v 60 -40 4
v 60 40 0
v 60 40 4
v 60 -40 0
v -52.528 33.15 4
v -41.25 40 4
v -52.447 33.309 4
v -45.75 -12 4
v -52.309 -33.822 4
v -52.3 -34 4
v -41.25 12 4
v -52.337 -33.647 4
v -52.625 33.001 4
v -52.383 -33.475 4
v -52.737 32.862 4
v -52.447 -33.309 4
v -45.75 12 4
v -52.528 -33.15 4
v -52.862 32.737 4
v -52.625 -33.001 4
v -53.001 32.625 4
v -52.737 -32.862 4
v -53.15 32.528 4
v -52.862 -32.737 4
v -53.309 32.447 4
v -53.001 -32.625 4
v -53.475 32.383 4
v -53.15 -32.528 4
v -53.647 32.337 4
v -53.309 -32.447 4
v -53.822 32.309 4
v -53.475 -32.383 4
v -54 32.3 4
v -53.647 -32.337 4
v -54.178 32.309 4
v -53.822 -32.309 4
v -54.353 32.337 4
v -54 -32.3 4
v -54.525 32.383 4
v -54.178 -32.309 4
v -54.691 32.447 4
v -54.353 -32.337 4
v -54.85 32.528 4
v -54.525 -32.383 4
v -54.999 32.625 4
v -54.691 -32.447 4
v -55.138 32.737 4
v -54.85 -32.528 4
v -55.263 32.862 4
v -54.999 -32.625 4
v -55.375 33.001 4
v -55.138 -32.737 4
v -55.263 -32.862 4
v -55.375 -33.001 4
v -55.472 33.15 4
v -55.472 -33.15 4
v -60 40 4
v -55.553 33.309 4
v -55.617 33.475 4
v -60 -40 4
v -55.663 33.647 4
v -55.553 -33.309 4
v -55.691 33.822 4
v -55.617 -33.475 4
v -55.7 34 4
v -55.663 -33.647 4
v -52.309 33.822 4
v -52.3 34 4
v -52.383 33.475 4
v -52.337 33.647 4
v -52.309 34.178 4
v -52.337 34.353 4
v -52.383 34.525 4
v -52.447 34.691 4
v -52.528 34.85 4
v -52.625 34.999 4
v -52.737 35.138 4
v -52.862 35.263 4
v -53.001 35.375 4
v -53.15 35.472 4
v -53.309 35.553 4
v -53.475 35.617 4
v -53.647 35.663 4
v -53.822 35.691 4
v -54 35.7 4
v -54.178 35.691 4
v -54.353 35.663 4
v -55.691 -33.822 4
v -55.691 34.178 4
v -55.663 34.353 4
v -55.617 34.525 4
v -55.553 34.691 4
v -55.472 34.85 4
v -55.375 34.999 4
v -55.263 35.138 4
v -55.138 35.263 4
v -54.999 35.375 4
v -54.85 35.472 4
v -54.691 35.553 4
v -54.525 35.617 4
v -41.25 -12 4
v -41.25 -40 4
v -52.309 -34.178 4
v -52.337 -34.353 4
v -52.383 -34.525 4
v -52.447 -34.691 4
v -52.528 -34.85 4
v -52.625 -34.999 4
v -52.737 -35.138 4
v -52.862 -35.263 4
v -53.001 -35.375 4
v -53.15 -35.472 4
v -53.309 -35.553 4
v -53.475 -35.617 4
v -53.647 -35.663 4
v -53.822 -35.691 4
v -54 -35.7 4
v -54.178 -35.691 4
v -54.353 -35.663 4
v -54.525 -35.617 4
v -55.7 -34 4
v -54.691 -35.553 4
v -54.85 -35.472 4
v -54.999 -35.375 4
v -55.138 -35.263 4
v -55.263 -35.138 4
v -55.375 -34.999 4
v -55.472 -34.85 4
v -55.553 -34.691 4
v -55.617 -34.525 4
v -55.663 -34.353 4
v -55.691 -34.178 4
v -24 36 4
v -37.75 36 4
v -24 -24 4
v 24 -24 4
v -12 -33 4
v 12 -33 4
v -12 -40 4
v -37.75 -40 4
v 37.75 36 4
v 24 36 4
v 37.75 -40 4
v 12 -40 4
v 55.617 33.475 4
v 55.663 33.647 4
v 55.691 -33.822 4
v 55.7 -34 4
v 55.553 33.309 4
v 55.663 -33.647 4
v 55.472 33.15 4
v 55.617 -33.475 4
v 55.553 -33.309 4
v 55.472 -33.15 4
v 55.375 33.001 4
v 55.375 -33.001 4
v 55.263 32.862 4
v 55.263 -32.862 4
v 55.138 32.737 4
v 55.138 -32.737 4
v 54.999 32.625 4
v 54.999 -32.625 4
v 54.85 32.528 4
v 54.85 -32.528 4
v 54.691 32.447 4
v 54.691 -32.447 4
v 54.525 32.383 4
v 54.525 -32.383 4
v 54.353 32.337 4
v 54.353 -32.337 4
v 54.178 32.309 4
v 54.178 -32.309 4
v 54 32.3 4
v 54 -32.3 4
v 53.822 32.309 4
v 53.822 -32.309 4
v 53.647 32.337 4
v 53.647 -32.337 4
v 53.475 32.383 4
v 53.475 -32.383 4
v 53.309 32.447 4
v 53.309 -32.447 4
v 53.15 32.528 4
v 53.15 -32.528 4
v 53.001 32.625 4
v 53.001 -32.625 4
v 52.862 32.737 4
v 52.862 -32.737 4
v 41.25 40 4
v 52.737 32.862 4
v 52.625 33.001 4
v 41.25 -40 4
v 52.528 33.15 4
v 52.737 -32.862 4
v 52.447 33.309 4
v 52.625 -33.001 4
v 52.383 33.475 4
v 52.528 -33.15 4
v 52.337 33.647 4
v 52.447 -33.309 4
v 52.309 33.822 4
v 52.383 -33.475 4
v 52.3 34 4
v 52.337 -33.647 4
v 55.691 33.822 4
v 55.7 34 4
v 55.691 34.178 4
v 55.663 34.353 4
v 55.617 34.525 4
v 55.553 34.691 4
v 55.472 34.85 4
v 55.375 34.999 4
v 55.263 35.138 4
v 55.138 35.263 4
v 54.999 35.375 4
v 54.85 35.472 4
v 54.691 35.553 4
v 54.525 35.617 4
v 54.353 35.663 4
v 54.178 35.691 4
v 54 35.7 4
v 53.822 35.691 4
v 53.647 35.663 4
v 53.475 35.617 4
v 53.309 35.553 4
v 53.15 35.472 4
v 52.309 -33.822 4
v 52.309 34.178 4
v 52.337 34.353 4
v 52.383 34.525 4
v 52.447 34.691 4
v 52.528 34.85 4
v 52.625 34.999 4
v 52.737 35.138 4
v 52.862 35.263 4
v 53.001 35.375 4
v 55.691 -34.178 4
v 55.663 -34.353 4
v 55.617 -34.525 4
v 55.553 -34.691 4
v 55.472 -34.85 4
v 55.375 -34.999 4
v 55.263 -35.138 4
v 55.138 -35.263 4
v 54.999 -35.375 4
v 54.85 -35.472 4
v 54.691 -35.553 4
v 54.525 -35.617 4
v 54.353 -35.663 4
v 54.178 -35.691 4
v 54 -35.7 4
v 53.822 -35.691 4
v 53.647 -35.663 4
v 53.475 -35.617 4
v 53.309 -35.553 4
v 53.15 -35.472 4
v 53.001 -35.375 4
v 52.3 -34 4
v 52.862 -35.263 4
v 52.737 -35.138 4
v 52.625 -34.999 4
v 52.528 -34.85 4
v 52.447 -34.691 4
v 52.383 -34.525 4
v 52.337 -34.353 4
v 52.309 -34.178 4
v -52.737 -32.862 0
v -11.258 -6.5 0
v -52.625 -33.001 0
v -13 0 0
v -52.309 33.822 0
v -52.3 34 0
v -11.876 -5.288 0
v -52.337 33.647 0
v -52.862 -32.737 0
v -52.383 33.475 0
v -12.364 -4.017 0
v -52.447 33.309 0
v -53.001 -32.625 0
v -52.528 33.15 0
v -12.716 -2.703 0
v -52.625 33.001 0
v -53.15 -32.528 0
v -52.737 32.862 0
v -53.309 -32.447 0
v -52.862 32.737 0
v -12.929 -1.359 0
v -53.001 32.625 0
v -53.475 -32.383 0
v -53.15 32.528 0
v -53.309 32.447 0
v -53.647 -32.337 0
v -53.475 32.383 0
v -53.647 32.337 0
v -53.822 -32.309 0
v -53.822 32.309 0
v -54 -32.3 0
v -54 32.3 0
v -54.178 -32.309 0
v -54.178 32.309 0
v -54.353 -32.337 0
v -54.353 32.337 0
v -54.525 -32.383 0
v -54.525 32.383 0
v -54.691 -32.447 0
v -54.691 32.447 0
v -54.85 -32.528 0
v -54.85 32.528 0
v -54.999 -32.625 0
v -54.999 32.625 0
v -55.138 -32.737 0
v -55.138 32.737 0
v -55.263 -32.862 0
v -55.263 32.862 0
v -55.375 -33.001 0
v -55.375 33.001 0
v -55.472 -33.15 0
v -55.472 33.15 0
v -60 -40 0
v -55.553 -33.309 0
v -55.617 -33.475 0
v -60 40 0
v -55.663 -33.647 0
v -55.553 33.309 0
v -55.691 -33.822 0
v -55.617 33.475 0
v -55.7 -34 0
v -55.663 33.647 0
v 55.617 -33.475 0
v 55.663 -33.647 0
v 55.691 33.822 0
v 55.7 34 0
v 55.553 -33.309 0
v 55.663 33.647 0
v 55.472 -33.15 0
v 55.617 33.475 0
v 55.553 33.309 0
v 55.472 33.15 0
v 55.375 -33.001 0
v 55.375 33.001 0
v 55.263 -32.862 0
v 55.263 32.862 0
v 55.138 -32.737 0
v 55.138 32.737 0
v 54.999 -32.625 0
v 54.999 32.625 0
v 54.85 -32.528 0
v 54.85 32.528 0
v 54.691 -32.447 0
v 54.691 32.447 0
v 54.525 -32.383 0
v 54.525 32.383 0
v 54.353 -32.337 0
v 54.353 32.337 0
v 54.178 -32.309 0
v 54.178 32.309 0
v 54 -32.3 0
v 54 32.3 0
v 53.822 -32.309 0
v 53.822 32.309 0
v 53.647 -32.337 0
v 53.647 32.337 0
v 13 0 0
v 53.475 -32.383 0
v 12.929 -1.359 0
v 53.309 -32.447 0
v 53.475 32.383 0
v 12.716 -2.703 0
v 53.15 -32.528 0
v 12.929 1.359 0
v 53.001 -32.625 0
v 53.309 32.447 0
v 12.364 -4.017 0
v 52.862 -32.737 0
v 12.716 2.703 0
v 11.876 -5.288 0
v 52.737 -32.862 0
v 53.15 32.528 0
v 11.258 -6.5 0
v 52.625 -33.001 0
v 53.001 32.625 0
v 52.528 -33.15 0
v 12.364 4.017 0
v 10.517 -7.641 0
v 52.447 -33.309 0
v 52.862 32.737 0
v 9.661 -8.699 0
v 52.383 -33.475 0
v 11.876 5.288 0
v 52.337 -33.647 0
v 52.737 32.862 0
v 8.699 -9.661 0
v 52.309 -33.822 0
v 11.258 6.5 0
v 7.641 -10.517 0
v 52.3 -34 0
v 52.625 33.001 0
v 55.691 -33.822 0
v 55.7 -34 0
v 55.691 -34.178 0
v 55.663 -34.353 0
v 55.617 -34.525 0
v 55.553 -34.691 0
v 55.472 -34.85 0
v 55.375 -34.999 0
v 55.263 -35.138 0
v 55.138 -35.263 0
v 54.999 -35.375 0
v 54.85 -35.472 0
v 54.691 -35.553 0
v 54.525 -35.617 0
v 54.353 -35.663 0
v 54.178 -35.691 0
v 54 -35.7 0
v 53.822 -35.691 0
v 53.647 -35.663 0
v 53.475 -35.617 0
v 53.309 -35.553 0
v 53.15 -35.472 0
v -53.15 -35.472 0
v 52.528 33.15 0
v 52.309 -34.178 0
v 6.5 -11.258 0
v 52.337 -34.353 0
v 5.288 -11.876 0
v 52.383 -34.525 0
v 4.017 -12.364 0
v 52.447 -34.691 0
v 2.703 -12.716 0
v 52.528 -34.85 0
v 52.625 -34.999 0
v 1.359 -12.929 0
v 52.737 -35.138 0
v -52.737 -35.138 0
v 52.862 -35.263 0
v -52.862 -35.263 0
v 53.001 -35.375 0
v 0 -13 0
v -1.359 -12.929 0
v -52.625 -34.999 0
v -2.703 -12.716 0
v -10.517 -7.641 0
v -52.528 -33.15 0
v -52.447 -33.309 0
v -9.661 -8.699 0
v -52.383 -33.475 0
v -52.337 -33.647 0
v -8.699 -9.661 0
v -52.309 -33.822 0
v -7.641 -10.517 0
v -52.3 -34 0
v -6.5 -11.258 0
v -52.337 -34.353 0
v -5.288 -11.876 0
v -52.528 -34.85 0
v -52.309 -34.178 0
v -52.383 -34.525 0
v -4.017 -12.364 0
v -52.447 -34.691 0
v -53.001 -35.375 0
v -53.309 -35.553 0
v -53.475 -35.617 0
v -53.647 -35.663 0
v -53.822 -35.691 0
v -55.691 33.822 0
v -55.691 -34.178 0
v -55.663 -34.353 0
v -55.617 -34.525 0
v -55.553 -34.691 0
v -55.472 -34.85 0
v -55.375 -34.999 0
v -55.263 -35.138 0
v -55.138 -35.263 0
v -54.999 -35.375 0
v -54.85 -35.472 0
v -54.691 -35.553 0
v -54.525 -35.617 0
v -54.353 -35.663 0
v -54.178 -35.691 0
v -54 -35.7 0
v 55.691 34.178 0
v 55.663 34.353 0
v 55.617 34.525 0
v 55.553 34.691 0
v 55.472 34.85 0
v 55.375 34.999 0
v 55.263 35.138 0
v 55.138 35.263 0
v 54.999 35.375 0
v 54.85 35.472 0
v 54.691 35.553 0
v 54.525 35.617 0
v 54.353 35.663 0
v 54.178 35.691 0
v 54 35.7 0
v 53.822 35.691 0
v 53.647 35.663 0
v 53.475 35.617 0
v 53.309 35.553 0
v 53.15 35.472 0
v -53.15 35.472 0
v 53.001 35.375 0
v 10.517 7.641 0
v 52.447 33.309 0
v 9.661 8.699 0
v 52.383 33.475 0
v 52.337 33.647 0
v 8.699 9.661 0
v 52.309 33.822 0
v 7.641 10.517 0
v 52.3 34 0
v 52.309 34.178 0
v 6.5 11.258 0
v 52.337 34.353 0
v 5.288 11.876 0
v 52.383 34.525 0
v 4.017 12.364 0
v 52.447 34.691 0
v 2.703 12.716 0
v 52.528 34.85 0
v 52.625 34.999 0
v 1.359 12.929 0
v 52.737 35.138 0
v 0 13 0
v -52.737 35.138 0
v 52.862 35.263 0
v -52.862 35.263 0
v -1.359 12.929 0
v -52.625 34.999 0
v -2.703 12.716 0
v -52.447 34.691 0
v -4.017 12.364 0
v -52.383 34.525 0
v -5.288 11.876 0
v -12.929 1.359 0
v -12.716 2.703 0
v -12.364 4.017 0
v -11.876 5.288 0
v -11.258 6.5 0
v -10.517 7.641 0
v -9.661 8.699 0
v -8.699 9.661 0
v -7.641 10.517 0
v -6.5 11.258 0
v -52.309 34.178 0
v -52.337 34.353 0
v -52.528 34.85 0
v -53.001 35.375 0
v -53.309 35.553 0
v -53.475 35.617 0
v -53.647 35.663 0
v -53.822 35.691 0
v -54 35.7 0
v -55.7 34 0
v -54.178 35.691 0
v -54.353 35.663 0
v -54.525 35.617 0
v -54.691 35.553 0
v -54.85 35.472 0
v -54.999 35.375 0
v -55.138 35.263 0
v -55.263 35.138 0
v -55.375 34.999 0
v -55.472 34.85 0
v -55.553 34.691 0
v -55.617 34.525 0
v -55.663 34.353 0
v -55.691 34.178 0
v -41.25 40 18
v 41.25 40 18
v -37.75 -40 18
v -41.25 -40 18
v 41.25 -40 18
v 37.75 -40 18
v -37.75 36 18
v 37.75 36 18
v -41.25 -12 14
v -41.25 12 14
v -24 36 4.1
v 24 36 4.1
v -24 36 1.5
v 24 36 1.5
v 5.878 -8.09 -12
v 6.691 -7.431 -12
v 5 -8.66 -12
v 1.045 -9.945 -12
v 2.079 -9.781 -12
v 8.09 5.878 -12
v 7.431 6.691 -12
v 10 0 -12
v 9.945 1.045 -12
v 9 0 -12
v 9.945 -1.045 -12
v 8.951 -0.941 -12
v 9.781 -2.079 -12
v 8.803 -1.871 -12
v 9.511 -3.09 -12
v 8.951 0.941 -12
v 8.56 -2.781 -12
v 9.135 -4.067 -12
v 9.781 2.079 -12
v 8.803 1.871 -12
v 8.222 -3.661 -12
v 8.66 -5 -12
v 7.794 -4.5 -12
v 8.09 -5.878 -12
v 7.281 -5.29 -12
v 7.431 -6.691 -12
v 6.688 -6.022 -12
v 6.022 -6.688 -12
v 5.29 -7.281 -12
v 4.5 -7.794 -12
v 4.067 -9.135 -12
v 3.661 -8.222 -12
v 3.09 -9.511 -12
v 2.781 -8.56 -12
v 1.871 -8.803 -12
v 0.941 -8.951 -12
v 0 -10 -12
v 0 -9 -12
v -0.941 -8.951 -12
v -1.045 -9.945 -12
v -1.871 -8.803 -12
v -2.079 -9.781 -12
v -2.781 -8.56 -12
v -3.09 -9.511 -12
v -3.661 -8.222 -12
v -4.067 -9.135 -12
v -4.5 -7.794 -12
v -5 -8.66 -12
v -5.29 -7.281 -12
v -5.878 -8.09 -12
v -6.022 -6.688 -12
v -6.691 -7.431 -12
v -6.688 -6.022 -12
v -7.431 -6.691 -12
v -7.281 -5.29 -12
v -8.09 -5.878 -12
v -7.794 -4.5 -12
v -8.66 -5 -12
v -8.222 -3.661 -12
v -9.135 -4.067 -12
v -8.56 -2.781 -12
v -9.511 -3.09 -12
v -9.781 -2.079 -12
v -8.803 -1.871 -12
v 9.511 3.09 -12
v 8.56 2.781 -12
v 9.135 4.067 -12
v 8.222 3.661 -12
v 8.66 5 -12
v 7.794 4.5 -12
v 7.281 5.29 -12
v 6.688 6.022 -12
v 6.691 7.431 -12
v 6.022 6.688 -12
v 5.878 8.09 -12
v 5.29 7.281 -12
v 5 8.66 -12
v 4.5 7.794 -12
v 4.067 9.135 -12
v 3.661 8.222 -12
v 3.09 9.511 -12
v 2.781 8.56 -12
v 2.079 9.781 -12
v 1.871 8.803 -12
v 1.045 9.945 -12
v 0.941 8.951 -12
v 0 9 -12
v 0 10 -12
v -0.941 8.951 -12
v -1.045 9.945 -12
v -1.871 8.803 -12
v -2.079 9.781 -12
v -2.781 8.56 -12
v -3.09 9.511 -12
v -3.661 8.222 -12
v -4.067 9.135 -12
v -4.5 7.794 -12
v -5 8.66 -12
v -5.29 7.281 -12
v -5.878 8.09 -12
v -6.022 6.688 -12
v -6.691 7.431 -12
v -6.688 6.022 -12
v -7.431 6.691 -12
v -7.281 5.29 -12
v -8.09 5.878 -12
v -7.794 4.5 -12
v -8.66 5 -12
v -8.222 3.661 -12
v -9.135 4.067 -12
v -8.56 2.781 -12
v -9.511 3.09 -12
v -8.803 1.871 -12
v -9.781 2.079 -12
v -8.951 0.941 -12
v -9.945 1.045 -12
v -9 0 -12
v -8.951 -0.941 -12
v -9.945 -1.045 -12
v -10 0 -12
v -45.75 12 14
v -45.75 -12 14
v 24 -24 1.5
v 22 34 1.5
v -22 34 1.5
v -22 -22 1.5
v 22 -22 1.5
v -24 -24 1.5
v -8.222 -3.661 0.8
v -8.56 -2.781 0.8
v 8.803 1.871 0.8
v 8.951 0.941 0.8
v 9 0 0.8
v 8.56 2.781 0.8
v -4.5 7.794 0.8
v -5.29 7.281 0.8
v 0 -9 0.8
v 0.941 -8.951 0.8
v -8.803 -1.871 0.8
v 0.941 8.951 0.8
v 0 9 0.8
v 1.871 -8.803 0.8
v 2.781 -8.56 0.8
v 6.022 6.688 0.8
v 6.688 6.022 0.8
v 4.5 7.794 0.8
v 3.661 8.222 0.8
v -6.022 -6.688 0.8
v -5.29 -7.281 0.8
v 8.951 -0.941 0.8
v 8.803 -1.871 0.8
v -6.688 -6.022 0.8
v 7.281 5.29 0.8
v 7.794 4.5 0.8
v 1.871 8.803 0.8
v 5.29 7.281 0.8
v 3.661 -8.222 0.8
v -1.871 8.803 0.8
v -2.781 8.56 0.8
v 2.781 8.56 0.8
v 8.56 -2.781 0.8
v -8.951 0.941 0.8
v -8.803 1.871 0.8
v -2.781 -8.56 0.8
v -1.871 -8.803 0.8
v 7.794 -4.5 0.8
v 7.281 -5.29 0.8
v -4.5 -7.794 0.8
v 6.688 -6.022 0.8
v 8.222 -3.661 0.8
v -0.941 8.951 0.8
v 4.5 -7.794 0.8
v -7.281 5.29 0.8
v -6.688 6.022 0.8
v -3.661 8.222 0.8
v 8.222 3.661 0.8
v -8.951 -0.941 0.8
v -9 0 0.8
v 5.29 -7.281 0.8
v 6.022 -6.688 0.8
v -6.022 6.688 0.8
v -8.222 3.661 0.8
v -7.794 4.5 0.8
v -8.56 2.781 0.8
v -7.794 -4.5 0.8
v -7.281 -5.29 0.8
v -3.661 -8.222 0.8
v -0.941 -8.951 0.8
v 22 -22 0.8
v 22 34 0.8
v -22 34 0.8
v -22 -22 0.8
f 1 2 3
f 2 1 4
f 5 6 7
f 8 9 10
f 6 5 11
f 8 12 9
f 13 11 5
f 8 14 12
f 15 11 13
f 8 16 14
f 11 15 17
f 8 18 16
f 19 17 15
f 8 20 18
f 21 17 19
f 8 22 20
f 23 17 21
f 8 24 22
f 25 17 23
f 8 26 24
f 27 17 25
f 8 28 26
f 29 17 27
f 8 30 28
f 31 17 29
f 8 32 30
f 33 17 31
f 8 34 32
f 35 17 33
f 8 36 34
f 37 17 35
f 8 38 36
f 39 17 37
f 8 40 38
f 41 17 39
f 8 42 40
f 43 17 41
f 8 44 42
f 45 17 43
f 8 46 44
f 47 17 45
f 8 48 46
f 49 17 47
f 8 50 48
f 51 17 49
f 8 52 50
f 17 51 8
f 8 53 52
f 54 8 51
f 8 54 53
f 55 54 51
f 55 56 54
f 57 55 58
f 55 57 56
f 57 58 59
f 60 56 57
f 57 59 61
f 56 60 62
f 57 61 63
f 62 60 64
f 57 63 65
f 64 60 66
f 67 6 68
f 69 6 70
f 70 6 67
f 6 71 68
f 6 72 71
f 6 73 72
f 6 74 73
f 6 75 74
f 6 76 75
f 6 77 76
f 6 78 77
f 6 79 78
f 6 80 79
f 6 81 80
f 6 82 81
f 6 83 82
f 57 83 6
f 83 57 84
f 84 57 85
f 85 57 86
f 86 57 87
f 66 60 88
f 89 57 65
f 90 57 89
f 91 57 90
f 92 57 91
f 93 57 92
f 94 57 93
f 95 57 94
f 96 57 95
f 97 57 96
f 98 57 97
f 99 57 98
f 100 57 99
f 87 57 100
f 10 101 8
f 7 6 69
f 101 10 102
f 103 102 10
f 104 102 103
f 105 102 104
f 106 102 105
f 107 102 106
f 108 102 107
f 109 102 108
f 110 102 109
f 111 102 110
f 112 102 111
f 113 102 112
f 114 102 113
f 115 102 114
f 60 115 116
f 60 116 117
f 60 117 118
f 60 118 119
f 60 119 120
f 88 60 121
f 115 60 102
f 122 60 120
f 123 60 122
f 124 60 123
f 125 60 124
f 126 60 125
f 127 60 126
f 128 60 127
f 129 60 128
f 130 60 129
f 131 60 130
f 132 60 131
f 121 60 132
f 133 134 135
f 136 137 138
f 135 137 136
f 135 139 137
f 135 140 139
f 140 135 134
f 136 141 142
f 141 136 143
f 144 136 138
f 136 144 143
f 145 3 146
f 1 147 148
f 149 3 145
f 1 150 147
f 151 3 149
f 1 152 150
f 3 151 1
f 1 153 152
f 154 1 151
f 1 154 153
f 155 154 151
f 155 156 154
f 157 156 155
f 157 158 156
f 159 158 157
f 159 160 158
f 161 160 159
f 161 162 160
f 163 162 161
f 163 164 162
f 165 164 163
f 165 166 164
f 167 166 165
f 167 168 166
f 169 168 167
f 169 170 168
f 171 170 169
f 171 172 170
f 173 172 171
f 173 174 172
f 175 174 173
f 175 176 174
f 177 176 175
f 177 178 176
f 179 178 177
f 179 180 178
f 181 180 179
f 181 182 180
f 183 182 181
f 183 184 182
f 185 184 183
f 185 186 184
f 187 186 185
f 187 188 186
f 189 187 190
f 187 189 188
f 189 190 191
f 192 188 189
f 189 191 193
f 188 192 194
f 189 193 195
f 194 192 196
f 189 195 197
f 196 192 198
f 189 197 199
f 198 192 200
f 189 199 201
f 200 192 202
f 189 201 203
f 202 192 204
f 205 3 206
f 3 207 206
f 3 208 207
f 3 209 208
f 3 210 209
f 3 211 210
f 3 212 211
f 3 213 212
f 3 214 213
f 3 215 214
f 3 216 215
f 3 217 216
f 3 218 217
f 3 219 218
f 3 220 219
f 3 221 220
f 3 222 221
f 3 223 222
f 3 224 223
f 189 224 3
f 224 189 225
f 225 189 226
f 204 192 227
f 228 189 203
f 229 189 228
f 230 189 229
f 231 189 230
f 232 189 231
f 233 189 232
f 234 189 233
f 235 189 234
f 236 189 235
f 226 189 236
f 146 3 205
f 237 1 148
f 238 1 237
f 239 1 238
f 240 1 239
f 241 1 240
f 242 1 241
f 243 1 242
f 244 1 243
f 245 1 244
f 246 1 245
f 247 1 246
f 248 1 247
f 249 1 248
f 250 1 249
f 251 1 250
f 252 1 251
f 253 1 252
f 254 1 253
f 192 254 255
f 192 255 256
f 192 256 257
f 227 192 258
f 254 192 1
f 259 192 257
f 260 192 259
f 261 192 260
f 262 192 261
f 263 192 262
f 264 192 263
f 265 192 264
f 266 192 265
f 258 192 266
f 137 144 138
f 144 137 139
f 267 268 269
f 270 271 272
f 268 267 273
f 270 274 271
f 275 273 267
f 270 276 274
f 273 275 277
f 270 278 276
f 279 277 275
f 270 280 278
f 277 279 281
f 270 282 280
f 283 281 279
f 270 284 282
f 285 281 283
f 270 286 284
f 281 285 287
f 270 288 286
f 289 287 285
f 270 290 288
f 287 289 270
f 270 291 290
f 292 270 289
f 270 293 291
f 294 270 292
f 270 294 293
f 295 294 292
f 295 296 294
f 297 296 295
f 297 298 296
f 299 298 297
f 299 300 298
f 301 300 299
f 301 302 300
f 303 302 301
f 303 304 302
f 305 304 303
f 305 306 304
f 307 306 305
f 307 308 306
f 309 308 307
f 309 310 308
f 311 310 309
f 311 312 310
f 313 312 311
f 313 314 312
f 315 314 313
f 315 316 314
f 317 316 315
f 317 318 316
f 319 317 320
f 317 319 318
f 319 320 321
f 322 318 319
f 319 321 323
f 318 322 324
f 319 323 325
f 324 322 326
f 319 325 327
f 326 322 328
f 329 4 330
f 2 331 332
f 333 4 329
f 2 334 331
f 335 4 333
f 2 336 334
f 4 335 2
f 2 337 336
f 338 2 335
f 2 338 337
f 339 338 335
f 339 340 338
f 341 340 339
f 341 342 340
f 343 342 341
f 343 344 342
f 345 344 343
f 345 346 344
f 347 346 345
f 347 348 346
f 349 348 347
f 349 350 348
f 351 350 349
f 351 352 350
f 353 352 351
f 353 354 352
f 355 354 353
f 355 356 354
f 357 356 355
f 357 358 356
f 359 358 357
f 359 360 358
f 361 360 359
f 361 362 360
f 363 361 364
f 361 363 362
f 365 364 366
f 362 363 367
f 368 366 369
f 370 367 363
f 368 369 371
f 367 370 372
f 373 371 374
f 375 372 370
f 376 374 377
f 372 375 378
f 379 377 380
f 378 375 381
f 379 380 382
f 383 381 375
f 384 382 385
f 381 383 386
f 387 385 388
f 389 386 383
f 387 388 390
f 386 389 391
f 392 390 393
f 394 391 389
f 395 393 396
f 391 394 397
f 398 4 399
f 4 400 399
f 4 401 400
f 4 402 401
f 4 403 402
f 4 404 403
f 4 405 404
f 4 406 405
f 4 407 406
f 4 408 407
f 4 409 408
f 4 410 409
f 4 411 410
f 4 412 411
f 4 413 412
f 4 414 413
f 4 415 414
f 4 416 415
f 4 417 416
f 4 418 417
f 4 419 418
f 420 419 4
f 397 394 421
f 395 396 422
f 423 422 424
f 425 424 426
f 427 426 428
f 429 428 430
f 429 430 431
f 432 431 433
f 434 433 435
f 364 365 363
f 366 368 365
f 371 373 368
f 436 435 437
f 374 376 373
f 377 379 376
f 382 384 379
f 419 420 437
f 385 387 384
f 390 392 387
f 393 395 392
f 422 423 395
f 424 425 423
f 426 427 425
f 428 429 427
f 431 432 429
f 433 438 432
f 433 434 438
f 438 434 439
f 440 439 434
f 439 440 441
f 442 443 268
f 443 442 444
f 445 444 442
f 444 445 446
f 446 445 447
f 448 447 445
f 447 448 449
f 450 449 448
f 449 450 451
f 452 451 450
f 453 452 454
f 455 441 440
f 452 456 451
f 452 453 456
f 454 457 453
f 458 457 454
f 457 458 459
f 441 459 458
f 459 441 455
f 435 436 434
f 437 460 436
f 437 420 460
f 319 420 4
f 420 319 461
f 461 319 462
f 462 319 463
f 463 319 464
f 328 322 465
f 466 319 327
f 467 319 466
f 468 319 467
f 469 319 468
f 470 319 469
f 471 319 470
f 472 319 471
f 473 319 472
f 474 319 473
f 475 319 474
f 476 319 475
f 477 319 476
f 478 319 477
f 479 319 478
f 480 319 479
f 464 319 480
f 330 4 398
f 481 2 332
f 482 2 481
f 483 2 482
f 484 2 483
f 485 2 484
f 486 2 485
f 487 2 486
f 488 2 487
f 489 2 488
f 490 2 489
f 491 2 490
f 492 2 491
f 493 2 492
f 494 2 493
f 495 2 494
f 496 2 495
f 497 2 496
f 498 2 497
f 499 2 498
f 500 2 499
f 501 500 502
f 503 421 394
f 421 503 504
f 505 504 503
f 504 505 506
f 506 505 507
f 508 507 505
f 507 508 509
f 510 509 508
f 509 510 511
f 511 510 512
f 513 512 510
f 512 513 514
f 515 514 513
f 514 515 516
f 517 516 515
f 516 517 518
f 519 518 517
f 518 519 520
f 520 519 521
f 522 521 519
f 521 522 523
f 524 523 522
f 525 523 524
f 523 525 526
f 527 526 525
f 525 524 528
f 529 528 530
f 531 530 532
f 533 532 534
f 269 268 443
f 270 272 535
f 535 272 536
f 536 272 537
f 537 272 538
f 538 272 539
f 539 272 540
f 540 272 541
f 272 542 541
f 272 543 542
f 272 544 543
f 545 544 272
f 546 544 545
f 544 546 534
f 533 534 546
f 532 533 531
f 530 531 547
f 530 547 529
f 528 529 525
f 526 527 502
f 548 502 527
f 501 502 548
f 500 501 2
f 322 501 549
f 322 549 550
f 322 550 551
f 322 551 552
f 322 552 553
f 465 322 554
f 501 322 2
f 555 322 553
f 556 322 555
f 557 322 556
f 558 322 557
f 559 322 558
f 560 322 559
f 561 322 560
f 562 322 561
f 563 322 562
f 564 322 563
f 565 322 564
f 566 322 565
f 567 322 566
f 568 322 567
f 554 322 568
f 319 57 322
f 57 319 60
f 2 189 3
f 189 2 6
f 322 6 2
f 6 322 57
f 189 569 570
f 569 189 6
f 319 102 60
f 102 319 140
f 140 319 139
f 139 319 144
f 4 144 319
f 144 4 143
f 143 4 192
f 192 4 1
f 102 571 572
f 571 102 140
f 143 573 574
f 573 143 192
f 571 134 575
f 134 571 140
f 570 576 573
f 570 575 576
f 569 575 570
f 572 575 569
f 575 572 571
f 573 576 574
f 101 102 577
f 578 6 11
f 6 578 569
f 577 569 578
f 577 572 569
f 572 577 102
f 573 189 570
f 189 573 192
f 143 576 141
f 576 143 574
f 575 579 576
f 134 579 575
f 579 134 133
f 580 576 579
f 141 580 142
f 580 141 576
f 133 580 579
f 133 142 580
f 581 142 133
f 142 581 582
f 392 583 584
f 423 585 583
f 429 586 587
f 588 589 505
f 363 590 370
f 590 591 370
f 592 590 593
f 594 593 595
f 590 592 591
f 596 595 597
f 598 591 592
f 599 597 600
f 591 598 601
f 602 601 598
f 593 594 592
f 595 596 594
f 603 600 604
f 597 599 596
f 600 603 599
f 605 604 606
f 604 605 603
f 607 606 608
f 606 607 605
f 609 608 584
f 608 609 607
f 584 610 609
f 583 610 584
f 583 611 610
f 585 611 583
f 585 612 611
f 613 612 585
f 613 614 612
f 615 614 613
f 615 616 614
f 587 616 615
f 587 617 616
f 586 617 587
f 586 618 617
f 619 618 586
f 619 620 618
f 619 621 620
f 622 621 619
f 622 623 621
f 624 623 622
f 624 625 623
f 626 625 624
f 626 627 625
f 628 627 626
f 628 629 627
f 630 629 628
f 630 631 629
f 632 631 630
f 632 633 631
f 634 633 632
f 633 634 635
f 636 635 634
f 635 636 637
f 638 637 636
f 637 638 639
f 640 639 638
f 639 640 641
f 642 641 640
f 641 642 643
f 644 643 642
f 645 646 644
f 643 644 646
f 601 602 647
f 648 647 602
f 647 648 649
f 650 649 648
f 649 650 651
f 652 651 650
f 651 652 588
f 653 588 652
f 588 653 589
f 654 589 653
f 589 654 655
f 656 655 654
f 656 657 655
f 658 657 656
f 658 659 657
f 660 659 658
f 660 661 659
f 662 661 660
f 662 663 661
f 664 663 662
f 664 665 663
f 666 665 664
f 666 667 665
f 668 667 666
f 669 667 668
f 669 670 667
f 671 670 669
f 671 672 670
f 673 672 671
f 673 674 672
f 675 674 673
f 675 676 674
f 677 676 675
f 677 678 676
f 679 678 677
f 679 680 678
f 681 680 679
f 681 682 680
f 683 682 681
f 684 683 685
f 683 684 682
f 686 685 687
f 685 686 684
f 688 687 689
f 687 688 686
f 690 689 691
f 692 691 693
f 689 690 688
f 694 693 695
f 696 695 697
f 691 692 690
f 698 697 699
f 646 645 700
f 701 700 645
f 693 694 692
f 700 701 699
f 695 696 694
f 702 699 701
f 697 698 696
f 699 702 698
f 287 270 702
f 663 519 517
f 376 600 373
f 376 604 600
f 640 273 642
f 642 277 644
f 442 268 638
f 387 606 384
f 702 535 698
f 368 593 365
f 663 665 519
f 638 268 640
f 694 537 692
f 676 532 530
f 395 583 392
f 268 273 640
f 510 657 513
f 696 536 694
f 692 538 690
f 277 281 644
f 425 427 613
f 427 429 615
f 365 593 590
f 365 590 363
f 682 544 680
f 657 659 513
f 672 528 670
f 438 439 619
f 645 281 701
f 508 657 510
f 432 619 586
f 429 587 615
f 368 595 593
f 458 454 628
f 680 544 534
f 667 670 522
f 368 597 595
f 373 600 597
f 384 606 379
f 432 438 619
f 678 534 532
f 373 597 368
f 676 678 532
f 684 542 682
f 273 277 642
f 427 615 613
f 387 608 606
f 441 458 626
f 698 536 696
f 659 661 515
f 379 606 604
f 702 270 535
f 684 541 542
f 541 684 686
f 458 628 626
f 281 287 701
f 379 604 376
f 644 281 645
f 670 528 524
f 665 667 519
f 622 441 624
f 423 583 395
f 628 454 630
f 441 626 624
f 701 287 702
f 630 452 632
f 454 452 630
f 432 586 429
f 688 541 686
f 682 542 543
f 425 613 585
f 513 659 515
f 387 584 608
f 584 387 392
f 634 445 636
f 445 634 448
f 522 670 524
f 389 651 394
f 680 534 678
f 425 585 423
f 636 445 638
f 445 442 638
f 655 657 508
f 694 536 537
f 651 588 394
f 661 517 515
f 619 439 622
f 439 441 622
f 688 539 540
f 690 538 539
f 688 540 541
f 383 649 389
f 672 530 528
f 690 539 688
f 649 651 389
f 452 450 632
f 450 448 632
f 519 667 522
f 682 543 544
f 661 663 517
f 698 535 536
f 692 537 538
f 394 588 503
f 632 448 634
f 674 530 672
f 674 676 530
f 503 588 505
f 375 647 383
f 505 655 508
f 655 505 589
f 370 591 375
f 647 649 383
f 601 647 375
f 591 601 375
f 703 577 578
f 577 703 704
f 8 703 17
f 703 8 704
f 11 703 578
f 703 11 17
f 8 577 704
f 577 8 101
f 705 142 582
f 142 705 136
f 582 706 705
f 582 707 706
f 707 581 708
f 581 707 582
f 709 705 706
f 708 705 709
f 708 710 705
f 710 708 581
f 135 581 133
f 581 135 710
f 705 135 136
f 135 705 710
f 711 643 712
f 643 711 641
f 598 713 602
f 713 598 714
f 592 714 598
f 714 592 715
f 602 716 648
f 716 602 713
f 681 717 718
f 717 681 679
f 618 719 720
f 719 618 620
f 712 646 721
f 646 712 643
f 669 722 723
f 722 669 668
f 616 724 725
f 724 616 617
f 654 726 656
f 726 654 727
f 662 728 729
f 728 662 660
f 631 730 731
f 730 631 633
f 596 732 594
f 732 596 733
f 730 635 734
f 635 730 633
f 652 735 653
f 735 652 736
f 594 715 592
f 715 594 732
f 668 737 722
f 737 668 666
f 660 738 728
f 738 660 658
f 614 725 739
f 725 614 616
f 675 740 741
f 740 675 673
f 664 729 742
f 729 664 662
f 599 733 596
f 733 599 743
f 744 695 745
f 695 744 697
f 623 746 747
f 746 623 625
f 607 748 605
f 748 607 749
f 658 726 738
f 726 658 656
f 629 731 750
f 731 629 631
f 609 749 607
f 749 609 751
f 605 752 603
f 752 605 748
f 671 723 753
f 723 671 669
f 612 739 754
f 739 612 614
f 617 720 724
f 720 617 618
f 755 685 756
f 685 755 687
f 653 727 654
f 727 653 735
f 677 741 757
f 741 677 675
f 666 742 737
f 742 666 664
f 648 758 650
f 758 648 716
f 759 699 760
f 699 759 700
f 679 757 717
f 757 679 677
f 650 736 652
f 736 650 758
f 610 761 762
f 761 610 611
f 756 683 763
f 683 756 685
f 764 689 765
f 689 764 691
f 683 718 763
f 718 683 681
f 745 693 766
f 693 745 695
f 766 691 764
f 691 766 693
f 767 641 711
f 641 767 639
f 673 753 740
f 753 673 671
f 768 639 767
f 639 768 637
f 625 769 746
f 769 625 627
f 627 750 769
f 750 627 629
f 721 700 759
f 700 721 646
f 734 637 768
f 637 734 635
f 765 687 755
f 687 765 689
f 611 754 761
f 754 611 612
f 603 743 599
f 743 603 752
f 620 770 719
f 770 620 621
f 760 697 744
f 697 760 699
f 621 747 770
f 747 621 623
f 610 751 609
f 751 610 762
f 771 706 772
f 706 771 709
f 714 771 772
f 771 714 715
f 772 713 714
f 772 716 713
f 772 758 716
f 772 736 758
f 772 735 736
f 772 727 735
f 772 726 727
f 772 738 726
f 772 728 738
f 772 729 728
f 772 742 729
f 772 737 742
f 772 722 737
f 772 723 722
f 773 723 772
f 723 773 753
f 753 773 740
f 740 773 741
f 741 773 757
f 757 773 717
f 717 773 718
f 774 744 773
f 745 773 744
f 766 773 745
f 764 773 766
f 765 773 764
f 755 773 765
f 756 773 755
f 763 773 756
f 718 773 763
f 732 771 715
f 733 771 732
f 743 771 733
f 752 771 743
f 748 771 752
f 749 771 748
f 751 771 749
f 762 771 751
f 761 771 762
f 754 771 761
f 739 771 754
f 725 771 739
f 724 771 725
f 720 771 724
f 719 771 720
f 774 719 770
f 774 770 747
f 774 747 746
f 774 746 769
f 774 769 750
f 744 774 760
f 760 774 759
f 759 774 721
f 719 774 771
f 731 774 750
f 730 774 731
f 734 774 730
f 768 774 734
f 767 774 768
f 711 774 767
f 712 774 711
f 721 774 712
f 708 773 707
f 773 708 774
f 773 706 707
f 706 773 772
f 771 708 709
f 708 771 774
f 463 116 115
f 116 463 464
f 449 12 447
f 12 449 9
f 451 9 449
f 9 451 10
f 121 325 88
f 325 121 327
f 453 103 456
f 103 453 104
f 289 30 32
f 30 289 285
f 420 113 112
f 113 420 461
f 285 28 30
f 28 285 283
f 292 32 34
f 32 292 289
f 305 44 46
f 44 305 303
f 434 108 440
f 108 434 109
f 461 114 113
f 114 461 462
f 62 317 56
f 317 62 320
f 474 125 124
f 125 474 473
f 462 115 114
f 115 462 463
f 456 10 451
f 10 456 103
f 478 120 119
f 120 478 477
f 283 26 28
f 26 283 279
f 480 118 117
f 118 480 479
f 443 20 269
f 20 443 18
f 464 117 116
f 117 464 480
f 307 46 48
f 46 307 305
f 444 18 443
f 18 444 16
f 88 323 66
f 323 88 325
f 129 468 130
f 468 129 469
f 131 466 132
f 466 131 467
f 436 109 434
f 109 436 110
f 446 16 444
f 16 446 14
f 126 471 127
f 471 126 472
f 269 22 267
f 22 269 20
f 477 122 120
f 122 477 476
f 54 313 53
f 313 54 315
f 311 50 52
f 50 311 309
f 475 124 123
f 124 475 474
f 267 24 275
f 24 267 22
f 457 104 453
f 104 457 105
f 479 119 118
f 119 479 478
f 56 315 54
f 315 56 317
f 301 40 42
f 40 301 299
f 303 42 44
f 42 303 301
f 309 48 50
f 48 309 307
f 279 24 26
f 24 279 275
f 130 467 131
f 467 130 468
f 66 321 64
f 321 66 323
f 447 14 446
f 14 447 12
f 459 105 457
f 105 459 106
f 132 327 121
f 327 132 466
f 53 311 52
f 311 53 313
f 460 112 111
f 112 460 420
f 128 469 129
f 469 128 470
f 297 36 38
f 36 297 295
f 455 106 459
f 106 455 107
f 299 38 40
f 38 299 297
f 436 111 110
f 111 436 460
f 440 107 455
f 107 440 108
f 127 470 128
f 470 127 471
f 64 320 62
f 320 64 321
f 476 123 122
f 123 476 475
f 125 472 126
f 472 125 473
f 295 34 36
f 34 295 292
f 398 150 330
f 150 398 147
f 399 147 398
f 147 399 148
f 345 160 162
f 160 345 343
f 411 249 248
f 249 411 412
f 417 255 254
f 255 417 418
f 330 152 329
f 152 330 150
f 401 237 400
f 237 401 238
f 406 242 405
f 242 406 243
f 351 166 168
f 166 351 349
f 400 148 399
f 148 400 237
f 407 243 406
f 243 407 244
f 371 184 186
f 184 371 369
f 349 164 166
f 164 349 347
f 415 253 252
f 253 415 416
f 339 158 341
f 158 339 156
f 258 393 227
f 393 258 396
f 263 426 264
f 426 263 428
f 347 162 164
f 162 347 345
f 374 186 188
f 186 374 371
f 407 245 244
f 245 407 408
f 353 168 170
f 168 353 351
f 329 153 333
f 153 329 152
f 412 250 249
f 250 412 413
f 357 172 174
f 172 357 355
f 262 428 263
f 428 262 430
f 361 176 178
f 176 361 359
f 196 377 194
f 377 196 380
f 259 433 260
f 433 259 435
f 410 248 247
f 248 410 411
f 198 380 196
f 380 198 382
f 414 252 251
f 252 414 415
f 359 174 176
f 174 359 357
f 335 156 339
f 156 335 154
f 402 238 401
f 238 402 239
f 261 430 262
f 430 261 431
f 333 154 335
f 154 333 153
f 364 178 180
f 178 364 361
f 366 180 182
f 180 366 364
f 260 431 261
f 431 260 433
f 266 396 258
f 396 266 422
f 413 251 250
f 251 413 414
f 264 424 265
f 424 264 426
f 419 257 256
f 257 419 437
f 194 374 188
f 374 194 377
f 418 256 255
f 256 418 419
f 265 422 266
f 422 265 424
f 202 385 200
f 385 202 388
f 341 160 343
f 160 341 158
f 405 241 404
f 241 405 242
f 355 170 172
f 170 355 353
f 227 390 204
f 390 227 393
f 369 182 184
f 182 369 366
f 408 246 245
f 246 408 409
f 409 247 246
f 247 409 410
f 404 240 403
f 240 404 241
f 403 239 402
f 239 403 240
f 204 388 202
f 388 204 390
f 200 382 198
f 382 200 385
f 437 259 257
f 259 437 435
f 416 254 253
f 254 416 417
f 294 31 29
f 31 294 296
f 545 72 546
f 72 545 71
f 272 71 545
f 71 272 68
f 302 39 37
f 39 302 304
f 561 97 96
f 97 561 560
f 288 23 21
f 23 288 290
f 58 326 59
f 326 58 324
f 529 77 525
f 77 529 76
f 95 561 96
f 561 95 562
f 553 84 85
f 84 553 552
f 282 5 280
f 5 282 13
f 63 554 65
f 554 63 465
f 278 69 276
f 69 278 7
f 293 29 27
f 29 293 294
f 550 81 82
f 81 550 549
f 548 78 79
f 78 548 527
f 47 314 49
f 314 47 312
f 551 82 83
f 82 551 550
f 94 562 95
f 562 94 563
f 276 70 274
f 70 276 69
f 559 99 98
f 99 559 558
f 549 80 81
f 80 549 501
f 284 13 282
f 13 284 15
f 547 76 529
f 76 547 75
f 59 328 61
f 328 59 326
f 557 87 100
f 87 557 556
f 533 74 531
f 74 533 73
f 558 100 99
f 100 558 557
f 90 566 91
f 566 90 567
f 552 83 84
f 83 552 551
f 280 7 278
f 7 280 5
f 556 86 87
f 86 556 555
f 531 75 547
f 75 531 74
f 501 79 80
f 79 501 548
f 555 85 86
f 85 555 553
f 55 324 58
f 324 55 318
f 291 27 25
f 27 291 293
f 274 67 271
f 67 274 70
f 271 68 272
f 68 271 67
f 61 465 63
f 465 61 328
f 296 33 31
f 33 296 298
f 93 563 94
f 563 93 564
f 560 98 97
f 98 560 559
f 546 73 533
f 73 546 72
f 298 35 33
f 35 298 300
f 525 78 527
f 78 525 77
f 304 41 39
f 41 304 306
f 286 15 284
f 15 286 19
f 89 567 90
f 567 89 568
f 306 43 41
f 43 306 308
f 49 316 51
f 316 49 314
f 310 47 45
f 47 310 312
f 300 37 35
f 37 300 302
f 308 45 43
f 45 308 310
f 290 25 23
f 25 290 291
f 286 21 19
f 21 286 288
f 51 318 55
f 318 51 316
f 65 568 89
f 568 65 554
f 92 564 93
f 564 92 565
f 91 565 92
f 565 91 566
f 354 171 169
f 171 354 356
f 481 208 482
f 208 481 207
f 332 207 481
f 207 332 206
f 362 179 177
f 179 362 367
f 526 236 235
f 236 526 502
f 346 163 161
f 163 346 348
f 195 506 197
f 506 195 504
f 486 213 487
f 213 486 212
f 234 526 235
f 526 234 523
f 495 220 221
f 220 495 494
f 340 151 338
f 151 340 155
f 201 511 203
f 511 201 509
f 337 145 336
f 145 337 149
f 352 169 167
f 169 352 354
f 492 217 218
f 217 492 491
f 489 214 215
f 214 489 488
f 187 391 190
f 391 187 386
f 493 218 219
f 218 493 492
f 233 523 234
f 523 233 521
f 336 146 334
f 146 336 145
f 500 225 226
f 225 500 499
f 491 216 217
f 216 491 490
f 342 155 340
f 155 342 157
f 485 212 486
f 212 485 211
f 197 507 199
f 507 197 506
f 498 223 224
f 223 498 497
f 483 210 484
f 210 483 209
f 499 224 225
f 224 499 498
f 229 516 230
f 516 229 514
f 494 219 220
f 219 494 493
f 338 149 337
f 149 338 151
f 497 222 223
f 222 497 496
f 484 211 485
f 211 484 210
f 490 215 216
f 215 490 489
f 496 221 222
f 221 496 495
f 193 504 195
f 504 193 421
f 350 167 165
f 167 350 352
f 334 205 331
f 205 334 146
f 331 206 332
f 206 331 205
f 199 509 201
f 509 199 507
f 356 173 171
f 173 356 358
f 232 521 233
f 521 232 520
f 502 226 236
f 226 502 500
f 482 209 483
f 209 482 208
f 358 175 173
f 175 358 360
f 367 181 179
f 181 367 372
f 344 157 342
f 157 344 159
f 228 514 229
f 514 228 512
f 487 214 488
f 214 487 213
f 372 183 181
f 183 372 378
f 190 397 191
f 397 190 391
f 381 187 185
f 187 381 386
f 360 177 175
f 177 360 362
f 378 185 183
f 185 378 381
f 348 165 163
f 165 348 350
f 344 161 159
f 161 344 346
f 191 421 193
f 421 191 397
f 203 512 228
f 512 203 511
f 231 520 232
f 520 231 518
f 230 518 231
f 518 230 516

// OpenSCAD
// =============================================================================
// โครงการวิจัย: การพัฒนาชุดวิเคราะห์ปริมาณไนโตรเจนและฟอสฟอรัสในดินแบบพกพาด้วยหลักการสะท้อนแสงร่วมกับปัญญาประดิษฐ์
// หัวหน้าโครงการ: ผศ.ดร.ชีวะ ทัศนา (มหาวิทยาลัยราชภัฏรำไพพรรณี)
// ชื่องาน: โมเดลฝาบนแท่นจับยึดสมาร์ทโฟน OPPO เฉพาะทาง (Custom OPPO Smartphone Mount Lid)
// ไฟล์: dark_chamber_oppo_mount.scad
// =============================================================================

$fn = 60; // ความละเอียดของส่วนโค้ง

// พารามิเตอร์ขนาดกล่อง Dark Chamber หลัก
box_w           = 120.0; // ความกว้างฝาปิด (มม.)
box_l           = 80.0;  // ความยาวฝาปิด (มม.)
lid_thick       = 4.0;   // ความหนาแผ่นฝาปิด

// พารามิเตอร์เฉพาะสำหรับสมาร์ทโฟน OPPO (Reno / Find / A Series)
oppo_width      = 75.5;  // ความกว้างตัวเครื่องรวมเคสบาง (มม.)
oppo_thick      = 8.5;   // ความหนาตัวเครื่อง (มม.)
rail_height     = 14.0;  // ความสูงปีกประคองด้านข้าง
camera_bump_w   = 44.0;  // ความกว้างเบ้าโมดูลกล้องนูน OPPO
camera_bump_l   = 56.0;  // ความยาวเบ้าโมดูลกล้องนูน OPPO
camera_bump_d   = 3.2;   // ความลึกหลุมรับโมดูลกล้อง
aperture_dia    = 18.0;  // ช่องรับแสง 0 องศา สู่เลนส์หลัก

// พารามิเตอร์ปะเก็นยางกันแสง EVA รอบโมดูลกล้อง OPPO
gasket_trench_w = 48.0;
gasket_trench_l = 60.0;
gasket_depth    = 2.5;

module oppo_mount_lid() {
    difference() {
        union() {
            // 1. แผ่นฝาบนปิดกล่องหลัก
            translate([-box_w/2, -box_l/2, 0])
                cube([box_w, box_l, lid_thick]);

            // 2. ปีกประคองขอบเครื่อง OPPO ซ้าย-ขวา
            translate([-oppo_width/2 - 3.5, -box_l/2, lid_thick])
                cube([3.5, box_l, rail_height]);
            translate([oppo_width/2, -box_l/2, lid_thick])
                cube([3.5, box_l, rail_height]);

            // 3. ปีกประคองหัวเครื่องด้านบน
            translate([-oppo_width/2, box_l/2 - 4.0, lid_thick])
                cube([oppo_width, 4.0, rail_height]);

            // 4. กรวยดักแสงทางเดินแสง 0 องศา ยื่นลงไปในกล่องมืด
            translate([0, 0, -12.0])
                cylinder(d1=aperture_dia + 2, d2=aperture_dia + 8, h=12.0);
                
            // 5. ตัวล็อกเขี้ยวเลื่อนด้านข้าง (Side Lock Catch)
            translate([-oppo_width/2 - 8.0, -12.0, lid_thick])
                cube([5.0, 24.0, 10.0]);
        }

        // --- ส่วนที่เจาะออก (Subtractions) ---

        // A. รูรับแสงตั้งฉาก 0 องศา มุ่งสู่ผิวหน้าดินในถาด
        translate([0, 0, -13.0])
            cylinder(d=aperture_dia, h=25.0);

        // B. หลุมเบ้ารองรับโมดูลกล้องนูนของ OPPO (Camera Island Recess)
        translate([-camera_bump_w/2, -camera_bump_l/2 + 6, lid_thick - camera_bump_d])
            cube([camera_bump_w, camera_bump_l, camera_bump_d + 0.1]);

        // C. ร่องวางแผ่นปะเก็นยางโฟม EVA สีดำซีลกันแสงรั่ว 100%
        translate([-gasket_trench_w/2, -gasket_trench_l/2 + 6, lid_thick - gasket_depth])
            difference() {
                cube([gasket_trench_w, gasket_trench_l, gasket_depth + 0.1]);
                translate([2.5, 2.5, -0.1])
                    cube([gasket_trench_w - 5.0, gasket_trench_l - 5.0, gasket_depth + 0.3]);
            }

        // D. ช่องเว้นสำหรับเสียบสาย USB-C OTG ด้านล่างเครื่อง
        translate([-12.0, -box_l/2 - 1.0, lid_thick])
            cube([24.0, 8.0, 12.0]);

        // E. รูขันสกรู M3 ยึดเข้ากับกล่องหลัก 4 จุด
        translate([-box_w/2 + 6, -box_l/2 + 6, -1]) cylinder(d=3.4, h=lid_thick + 2);
        translate([box_w/2 - 6, -box_l/2 + 6, -1])  cylinder(d=3.4, h=lid_thick + 2);
        translate([-box_w/2 + 6, box_l/2 - 6, -1])  cylinder(d=3.4, h=lid_thick + 2);
        translate([box_w/2 - 6, box_l/2 - 6, -1])   cylinder(d=3.4, h=lid_thick + 2);
    }
}

// แสดงผลโมเดลสีดำด้าน
color([0.15, 0.15, 0.15, 1.0])
    oppo_mount_lid();
